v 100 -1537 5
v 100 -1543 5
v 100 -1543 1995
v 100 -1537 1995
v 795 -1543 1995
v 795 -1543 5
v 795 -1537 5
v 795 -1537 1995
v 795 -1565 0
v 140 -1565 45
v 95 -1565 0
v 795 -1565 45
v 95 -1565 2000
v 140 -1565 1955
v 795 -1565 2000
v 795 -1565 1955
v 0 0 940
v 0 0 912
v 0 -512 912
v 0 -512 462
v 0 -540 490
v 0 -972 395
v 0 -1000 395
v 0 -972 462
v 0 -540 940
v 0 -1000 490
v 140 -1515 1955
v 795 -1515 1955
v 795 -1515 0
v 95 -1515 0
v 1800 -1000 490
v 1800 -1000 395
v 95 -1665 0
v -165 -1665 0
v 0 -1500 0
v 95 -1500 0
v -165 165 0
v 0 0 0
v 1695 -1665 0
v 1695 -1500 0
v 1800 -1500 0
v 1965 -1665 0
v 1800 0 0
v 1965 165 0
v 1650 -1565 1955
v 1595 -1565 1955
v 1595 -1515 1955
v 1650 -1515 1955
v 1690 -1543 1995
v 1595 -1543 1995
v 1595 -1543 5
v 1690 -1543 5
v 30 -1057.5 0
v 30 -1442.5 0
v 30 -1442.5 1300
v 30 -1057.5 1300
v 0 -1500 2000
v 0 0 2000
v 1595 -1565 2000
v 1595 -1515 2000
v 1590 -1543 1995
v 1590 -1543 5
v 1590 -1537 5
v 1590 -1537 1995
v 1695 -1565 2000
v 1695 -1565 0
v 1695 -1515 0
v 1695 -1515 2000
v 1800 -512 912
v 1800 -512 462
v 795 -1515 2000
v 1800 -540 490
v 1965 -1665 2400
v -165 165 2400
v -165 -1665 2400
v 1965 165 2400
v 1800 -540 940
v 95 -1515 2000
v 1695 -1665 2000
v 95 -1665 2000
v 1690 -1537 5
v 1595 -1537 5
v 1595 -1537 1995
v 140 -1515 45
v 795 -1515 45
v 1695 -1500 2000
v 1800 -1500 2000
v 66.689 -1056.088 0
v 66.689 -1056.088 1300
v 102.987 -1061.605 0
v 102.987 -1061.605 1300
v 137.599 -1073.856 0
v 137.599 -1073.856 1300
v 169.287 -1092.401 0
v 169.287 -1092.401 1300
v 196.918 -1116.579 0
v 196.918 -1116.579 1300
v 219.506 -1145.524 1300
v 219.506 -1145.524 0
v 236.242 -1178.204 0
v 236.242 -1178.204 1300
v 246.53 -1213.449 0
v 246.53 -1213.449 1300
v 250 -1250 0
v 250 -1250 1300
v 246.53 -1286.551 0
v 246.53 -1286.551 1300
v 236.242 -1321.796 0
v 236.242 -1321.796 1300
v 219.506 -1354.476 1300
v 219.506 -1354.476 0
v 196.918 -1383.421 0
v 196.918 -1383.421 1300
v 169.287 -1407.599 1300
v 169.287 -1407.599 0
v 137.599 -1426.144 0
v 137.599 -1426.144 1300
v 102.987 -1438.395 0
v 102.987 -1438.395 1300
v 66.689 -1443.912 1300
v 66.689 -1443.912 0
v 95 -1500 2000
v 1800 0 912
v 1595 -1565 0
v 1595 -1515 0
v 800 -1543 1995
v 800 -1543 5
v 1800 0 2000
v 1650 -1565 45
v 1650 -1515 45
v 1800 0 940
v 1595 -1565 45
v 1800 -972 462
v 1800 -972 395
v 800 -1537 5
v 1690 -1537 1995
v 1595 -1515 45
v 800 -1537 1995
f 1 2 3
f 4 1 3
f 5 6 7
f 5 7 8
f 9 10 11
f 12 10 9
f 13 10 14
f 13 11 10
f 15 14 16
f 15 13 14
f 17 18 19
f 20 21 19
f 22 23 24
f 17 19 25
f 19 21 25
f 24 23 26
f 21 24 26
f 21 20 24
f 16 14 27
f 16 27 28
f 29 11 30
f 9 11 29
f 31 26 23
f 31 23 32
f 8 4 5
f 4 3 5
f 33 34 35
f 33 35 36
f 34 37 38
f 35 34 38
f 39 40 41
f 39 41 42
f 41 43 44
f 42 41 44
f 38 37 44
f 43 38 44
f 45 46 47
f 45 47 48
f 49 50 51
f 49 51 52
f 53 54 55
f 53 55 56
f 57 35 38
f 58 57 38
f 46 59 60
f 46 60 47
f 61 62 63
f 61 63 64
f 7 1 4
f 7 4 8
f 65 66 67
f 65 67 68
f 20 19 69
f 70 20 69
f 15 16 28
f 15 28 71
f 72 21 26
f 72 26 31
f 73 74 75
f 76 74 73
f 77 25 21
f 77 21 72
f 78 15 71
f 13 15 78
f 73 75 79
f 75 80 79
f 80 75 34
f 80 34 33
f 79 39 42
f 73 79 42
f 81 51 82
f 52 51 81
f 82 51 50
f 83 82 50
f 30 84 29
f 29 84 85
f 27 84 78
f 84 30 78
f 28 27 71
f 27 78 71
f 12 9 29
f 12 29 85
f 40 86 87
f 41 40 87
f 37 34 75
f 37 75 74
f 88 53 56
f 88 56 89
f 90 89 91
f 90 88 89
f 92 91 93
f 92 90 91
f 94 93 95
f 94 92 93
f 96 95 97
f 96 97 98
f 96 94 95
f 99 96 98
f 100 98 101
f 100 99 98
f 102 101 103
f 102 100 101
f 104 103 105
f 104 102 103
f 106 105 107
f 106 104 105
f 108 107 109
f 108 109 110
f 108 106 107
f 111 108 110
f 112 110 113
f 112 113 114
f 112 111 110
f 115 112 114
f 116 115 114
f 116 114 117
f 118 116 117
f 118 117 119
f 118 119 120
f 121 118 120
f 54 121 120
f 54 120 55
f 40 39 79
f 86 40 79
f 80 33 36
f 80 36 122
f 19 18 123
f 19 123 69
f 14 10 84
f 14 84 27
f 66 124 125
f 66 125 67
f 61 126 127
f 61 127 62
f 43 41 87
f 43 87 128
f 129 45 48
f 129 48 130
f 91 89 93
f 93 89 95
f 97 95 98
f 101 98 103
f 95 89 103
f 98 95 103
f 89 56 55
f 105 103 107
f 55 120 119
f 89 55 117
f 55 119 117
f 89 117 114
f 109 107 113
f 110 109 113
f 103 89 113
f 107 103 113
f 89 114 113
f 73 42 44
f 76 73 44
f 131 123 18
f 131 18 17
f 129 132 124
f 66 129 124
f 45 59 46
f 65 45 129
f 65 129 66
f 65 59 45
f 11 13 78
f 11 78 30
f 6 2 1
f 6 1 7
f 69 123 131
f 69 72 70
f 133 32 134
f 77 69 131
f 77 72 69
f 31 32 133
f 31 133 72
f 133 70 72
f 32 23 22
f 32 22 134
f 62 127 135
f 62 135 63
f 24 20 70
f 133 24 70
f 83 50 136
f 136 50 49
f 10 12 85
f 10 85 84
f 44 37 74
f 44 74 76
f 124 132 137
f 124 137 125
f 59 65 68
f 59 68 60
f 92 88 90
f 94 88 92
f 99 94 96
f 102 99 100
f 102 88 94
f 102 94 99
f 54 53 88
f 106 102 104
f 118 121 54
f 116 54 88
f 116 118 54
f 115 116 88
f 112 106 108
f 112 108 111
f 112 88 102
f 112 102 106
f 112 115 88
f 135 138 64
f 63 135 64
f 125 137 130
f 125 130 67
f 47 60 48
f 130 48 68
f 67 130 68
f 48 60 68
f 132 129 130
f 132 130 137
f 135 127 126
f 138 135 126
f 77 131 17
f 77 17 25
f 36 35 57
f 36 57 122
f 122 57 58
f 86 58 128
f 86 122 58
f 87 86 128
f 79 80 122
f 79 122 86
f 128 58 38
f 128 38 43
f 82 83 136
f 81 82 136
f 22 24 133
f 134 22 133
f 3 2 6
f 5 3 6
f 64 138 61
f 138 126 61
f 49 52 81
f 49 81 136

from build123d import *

# Parameters (mm, degrees)
F0_W      = 2130
F0_H      = 1830
F0_W_2    = 1800
F0_H_2    = 1500
F1_DEPTH  = 2400
F2_W      = 1600
F2_H      = 2000
F3_DEPTH  = 165
F4_W      = 2130
F4_H      = 1830
F5_DEPTH  = 400
F8_DEPTH  = 50
F10_W     = 695
F10_H     = 1990
F11_DEPTH = 3
F10_W_2   = 790
F10_W_3   = 95
F12_W     = 540
F12_H     = 28
F13_DEPTH = 1800
F14_W     = 1800
F14_H     = 478
F15_DEPTH = 28
F16_W     = 1800
F16_H     = 28
F17_DEPTH = 460
F18_W     = 1800
F18_H     = 95
F19_DEPTH = 28
F21_DEPTH = 1300


with BuildPart() as f1:
    # F0 (on Top) → F1 (new body)
    with BuildSketch(Plane.XY):
        with Locations((900, -750)):
            Rectangle(F0_W, F0_H)
        with Locations((900, -750)):
            Rectangle(F0_W_2, F0_H_2, mode=Mode.SUBTRACT)
    extrude(amount=F1_DEPTH)

    # F2 (on face) → F3 (cut, through all)
    with BuildSketch(Plane.XZ.offset(1665)):
        with Locations((895, 1000)):
            Rectangle(F2_W, F2_H)
    extrude(amount=-F3_DEPTH, mode=Mode.SUBTRACT)

    # F4 (on face) → F5 (join, through all)
    with BuildSketch(Plane.XY.offset(2400)):
        with Locations((900, -750)):
            Rectangle(F4_W, F4_H)
    extrude(amount=-F5_DEPTH)


with BuildPart() as f8:
    # F7 (on offset) → F8 (new body)
    with BuildSketch(Plane.XZ.offset(1565)):
        Polygon((795, 45), (140, 45), (140, 1955), (795, 1955), (795, 2000), (95, 2000), (95, 0), (795, 0), align=None)
    extrude(amount=-F8_DEPTH)


with BuildPart() as f8b:
    # F7 (on offset) → F8, piece 2 (new body)
    with BuildSketch(Plane.XZ.offset(1565)):
        Polygon((1595, 1955), (1650, 1955), (1650, 45), (1595, 45), (1595, 0), (1695, 0), (1695, 2000), (1595, 2000), align=None)
    extrude(amount=-F8_DEPTH)


with BuildPart() as f11:
    # F10 (on offset) → F11 (new body, symmetric)
    with BuildSketch(Plane.XZ.offset(1540)):
        with Locations((447.5, 1000)):
            Rectangle(F10_W, F10_H)
    extrude(amount=F11_DEPTH, both=True)


with BuildPart() as f11b:
    # F10 (on offset) → F11, piece 2 (new body, symmetric)
    with BuildSketch(Plane.XZ.offset(1540)):
        with Locations((1195, 1000)):
            Rectangle(F10_W_2, F10_H)
    extrude(amount=F11_DEPTH, both=True)


with BuildPart() as f11c:
    # F10 (on offset) → F11, piece 3 (new body, symmetric)
    with BuildSketch(Plane.XZ.offset(1540)):
        with Locations((1642.5, 1000)):
            Rectangle(F10_W_3, F10_H)
    extrude(amount=F11_DEPTH, both=True)


with BuildPart() as f13:
    # F12 (on face) → F13 (new body, through all)
    with BuildSketch(Plane(origin=(1800, 0, 0), x_dir=(0, -1, 0), z_dir=(-1, 0, 0))):
        with Locations((270, 926)):
            Rectangle(F12_W, F12_H)
    extrude(amount=F13_DEPTH)

    # F14 (on face) → F15 (join)
    with BuildSketch(Plane.XZ.offset(540)):
        with Locations((900, 701)):
            Rectangle(F14_W, F14_H)
    extrude(amount=-F15_DEPTH)

    # F16 (on face) → F17 (join)
    with BuildSketch(Plane.XZ.offset(540)):
        with Locations((900, 476)):
            Rectangle(F16_W, F16_H)
    extrude(amount=F17_DEPTH)

    # F18 (on face) → F19 (join)
    with BuildSketch(Plane.XZ.offset(1000)):
        with Locations((900, 442.5)):
            Rectangle(F18_W, F18_H)
    extrude(amount=-F19_DEPTH)


with BuildPart() as f21:
    # F20 (on face) → F21 (new body)
    with BuildSketch(Plane(origin=(0, 0, 0), x_dir=(1, 0, 0), z_dir=(0, 0, -1))):
        with BuildLine():
            Line((30, 1442.5), (30, 1057.5))
            ThreePointArc((30, 1057.5), (250, 1250), (30, 1442.5))
        make_face()
    extrude(amount=-F21_DEPTH)


solid = Compound([f1.part, f8.part, f8b.part, f11.part, f11b.part, f11c.part, f13.part, f21.part])
